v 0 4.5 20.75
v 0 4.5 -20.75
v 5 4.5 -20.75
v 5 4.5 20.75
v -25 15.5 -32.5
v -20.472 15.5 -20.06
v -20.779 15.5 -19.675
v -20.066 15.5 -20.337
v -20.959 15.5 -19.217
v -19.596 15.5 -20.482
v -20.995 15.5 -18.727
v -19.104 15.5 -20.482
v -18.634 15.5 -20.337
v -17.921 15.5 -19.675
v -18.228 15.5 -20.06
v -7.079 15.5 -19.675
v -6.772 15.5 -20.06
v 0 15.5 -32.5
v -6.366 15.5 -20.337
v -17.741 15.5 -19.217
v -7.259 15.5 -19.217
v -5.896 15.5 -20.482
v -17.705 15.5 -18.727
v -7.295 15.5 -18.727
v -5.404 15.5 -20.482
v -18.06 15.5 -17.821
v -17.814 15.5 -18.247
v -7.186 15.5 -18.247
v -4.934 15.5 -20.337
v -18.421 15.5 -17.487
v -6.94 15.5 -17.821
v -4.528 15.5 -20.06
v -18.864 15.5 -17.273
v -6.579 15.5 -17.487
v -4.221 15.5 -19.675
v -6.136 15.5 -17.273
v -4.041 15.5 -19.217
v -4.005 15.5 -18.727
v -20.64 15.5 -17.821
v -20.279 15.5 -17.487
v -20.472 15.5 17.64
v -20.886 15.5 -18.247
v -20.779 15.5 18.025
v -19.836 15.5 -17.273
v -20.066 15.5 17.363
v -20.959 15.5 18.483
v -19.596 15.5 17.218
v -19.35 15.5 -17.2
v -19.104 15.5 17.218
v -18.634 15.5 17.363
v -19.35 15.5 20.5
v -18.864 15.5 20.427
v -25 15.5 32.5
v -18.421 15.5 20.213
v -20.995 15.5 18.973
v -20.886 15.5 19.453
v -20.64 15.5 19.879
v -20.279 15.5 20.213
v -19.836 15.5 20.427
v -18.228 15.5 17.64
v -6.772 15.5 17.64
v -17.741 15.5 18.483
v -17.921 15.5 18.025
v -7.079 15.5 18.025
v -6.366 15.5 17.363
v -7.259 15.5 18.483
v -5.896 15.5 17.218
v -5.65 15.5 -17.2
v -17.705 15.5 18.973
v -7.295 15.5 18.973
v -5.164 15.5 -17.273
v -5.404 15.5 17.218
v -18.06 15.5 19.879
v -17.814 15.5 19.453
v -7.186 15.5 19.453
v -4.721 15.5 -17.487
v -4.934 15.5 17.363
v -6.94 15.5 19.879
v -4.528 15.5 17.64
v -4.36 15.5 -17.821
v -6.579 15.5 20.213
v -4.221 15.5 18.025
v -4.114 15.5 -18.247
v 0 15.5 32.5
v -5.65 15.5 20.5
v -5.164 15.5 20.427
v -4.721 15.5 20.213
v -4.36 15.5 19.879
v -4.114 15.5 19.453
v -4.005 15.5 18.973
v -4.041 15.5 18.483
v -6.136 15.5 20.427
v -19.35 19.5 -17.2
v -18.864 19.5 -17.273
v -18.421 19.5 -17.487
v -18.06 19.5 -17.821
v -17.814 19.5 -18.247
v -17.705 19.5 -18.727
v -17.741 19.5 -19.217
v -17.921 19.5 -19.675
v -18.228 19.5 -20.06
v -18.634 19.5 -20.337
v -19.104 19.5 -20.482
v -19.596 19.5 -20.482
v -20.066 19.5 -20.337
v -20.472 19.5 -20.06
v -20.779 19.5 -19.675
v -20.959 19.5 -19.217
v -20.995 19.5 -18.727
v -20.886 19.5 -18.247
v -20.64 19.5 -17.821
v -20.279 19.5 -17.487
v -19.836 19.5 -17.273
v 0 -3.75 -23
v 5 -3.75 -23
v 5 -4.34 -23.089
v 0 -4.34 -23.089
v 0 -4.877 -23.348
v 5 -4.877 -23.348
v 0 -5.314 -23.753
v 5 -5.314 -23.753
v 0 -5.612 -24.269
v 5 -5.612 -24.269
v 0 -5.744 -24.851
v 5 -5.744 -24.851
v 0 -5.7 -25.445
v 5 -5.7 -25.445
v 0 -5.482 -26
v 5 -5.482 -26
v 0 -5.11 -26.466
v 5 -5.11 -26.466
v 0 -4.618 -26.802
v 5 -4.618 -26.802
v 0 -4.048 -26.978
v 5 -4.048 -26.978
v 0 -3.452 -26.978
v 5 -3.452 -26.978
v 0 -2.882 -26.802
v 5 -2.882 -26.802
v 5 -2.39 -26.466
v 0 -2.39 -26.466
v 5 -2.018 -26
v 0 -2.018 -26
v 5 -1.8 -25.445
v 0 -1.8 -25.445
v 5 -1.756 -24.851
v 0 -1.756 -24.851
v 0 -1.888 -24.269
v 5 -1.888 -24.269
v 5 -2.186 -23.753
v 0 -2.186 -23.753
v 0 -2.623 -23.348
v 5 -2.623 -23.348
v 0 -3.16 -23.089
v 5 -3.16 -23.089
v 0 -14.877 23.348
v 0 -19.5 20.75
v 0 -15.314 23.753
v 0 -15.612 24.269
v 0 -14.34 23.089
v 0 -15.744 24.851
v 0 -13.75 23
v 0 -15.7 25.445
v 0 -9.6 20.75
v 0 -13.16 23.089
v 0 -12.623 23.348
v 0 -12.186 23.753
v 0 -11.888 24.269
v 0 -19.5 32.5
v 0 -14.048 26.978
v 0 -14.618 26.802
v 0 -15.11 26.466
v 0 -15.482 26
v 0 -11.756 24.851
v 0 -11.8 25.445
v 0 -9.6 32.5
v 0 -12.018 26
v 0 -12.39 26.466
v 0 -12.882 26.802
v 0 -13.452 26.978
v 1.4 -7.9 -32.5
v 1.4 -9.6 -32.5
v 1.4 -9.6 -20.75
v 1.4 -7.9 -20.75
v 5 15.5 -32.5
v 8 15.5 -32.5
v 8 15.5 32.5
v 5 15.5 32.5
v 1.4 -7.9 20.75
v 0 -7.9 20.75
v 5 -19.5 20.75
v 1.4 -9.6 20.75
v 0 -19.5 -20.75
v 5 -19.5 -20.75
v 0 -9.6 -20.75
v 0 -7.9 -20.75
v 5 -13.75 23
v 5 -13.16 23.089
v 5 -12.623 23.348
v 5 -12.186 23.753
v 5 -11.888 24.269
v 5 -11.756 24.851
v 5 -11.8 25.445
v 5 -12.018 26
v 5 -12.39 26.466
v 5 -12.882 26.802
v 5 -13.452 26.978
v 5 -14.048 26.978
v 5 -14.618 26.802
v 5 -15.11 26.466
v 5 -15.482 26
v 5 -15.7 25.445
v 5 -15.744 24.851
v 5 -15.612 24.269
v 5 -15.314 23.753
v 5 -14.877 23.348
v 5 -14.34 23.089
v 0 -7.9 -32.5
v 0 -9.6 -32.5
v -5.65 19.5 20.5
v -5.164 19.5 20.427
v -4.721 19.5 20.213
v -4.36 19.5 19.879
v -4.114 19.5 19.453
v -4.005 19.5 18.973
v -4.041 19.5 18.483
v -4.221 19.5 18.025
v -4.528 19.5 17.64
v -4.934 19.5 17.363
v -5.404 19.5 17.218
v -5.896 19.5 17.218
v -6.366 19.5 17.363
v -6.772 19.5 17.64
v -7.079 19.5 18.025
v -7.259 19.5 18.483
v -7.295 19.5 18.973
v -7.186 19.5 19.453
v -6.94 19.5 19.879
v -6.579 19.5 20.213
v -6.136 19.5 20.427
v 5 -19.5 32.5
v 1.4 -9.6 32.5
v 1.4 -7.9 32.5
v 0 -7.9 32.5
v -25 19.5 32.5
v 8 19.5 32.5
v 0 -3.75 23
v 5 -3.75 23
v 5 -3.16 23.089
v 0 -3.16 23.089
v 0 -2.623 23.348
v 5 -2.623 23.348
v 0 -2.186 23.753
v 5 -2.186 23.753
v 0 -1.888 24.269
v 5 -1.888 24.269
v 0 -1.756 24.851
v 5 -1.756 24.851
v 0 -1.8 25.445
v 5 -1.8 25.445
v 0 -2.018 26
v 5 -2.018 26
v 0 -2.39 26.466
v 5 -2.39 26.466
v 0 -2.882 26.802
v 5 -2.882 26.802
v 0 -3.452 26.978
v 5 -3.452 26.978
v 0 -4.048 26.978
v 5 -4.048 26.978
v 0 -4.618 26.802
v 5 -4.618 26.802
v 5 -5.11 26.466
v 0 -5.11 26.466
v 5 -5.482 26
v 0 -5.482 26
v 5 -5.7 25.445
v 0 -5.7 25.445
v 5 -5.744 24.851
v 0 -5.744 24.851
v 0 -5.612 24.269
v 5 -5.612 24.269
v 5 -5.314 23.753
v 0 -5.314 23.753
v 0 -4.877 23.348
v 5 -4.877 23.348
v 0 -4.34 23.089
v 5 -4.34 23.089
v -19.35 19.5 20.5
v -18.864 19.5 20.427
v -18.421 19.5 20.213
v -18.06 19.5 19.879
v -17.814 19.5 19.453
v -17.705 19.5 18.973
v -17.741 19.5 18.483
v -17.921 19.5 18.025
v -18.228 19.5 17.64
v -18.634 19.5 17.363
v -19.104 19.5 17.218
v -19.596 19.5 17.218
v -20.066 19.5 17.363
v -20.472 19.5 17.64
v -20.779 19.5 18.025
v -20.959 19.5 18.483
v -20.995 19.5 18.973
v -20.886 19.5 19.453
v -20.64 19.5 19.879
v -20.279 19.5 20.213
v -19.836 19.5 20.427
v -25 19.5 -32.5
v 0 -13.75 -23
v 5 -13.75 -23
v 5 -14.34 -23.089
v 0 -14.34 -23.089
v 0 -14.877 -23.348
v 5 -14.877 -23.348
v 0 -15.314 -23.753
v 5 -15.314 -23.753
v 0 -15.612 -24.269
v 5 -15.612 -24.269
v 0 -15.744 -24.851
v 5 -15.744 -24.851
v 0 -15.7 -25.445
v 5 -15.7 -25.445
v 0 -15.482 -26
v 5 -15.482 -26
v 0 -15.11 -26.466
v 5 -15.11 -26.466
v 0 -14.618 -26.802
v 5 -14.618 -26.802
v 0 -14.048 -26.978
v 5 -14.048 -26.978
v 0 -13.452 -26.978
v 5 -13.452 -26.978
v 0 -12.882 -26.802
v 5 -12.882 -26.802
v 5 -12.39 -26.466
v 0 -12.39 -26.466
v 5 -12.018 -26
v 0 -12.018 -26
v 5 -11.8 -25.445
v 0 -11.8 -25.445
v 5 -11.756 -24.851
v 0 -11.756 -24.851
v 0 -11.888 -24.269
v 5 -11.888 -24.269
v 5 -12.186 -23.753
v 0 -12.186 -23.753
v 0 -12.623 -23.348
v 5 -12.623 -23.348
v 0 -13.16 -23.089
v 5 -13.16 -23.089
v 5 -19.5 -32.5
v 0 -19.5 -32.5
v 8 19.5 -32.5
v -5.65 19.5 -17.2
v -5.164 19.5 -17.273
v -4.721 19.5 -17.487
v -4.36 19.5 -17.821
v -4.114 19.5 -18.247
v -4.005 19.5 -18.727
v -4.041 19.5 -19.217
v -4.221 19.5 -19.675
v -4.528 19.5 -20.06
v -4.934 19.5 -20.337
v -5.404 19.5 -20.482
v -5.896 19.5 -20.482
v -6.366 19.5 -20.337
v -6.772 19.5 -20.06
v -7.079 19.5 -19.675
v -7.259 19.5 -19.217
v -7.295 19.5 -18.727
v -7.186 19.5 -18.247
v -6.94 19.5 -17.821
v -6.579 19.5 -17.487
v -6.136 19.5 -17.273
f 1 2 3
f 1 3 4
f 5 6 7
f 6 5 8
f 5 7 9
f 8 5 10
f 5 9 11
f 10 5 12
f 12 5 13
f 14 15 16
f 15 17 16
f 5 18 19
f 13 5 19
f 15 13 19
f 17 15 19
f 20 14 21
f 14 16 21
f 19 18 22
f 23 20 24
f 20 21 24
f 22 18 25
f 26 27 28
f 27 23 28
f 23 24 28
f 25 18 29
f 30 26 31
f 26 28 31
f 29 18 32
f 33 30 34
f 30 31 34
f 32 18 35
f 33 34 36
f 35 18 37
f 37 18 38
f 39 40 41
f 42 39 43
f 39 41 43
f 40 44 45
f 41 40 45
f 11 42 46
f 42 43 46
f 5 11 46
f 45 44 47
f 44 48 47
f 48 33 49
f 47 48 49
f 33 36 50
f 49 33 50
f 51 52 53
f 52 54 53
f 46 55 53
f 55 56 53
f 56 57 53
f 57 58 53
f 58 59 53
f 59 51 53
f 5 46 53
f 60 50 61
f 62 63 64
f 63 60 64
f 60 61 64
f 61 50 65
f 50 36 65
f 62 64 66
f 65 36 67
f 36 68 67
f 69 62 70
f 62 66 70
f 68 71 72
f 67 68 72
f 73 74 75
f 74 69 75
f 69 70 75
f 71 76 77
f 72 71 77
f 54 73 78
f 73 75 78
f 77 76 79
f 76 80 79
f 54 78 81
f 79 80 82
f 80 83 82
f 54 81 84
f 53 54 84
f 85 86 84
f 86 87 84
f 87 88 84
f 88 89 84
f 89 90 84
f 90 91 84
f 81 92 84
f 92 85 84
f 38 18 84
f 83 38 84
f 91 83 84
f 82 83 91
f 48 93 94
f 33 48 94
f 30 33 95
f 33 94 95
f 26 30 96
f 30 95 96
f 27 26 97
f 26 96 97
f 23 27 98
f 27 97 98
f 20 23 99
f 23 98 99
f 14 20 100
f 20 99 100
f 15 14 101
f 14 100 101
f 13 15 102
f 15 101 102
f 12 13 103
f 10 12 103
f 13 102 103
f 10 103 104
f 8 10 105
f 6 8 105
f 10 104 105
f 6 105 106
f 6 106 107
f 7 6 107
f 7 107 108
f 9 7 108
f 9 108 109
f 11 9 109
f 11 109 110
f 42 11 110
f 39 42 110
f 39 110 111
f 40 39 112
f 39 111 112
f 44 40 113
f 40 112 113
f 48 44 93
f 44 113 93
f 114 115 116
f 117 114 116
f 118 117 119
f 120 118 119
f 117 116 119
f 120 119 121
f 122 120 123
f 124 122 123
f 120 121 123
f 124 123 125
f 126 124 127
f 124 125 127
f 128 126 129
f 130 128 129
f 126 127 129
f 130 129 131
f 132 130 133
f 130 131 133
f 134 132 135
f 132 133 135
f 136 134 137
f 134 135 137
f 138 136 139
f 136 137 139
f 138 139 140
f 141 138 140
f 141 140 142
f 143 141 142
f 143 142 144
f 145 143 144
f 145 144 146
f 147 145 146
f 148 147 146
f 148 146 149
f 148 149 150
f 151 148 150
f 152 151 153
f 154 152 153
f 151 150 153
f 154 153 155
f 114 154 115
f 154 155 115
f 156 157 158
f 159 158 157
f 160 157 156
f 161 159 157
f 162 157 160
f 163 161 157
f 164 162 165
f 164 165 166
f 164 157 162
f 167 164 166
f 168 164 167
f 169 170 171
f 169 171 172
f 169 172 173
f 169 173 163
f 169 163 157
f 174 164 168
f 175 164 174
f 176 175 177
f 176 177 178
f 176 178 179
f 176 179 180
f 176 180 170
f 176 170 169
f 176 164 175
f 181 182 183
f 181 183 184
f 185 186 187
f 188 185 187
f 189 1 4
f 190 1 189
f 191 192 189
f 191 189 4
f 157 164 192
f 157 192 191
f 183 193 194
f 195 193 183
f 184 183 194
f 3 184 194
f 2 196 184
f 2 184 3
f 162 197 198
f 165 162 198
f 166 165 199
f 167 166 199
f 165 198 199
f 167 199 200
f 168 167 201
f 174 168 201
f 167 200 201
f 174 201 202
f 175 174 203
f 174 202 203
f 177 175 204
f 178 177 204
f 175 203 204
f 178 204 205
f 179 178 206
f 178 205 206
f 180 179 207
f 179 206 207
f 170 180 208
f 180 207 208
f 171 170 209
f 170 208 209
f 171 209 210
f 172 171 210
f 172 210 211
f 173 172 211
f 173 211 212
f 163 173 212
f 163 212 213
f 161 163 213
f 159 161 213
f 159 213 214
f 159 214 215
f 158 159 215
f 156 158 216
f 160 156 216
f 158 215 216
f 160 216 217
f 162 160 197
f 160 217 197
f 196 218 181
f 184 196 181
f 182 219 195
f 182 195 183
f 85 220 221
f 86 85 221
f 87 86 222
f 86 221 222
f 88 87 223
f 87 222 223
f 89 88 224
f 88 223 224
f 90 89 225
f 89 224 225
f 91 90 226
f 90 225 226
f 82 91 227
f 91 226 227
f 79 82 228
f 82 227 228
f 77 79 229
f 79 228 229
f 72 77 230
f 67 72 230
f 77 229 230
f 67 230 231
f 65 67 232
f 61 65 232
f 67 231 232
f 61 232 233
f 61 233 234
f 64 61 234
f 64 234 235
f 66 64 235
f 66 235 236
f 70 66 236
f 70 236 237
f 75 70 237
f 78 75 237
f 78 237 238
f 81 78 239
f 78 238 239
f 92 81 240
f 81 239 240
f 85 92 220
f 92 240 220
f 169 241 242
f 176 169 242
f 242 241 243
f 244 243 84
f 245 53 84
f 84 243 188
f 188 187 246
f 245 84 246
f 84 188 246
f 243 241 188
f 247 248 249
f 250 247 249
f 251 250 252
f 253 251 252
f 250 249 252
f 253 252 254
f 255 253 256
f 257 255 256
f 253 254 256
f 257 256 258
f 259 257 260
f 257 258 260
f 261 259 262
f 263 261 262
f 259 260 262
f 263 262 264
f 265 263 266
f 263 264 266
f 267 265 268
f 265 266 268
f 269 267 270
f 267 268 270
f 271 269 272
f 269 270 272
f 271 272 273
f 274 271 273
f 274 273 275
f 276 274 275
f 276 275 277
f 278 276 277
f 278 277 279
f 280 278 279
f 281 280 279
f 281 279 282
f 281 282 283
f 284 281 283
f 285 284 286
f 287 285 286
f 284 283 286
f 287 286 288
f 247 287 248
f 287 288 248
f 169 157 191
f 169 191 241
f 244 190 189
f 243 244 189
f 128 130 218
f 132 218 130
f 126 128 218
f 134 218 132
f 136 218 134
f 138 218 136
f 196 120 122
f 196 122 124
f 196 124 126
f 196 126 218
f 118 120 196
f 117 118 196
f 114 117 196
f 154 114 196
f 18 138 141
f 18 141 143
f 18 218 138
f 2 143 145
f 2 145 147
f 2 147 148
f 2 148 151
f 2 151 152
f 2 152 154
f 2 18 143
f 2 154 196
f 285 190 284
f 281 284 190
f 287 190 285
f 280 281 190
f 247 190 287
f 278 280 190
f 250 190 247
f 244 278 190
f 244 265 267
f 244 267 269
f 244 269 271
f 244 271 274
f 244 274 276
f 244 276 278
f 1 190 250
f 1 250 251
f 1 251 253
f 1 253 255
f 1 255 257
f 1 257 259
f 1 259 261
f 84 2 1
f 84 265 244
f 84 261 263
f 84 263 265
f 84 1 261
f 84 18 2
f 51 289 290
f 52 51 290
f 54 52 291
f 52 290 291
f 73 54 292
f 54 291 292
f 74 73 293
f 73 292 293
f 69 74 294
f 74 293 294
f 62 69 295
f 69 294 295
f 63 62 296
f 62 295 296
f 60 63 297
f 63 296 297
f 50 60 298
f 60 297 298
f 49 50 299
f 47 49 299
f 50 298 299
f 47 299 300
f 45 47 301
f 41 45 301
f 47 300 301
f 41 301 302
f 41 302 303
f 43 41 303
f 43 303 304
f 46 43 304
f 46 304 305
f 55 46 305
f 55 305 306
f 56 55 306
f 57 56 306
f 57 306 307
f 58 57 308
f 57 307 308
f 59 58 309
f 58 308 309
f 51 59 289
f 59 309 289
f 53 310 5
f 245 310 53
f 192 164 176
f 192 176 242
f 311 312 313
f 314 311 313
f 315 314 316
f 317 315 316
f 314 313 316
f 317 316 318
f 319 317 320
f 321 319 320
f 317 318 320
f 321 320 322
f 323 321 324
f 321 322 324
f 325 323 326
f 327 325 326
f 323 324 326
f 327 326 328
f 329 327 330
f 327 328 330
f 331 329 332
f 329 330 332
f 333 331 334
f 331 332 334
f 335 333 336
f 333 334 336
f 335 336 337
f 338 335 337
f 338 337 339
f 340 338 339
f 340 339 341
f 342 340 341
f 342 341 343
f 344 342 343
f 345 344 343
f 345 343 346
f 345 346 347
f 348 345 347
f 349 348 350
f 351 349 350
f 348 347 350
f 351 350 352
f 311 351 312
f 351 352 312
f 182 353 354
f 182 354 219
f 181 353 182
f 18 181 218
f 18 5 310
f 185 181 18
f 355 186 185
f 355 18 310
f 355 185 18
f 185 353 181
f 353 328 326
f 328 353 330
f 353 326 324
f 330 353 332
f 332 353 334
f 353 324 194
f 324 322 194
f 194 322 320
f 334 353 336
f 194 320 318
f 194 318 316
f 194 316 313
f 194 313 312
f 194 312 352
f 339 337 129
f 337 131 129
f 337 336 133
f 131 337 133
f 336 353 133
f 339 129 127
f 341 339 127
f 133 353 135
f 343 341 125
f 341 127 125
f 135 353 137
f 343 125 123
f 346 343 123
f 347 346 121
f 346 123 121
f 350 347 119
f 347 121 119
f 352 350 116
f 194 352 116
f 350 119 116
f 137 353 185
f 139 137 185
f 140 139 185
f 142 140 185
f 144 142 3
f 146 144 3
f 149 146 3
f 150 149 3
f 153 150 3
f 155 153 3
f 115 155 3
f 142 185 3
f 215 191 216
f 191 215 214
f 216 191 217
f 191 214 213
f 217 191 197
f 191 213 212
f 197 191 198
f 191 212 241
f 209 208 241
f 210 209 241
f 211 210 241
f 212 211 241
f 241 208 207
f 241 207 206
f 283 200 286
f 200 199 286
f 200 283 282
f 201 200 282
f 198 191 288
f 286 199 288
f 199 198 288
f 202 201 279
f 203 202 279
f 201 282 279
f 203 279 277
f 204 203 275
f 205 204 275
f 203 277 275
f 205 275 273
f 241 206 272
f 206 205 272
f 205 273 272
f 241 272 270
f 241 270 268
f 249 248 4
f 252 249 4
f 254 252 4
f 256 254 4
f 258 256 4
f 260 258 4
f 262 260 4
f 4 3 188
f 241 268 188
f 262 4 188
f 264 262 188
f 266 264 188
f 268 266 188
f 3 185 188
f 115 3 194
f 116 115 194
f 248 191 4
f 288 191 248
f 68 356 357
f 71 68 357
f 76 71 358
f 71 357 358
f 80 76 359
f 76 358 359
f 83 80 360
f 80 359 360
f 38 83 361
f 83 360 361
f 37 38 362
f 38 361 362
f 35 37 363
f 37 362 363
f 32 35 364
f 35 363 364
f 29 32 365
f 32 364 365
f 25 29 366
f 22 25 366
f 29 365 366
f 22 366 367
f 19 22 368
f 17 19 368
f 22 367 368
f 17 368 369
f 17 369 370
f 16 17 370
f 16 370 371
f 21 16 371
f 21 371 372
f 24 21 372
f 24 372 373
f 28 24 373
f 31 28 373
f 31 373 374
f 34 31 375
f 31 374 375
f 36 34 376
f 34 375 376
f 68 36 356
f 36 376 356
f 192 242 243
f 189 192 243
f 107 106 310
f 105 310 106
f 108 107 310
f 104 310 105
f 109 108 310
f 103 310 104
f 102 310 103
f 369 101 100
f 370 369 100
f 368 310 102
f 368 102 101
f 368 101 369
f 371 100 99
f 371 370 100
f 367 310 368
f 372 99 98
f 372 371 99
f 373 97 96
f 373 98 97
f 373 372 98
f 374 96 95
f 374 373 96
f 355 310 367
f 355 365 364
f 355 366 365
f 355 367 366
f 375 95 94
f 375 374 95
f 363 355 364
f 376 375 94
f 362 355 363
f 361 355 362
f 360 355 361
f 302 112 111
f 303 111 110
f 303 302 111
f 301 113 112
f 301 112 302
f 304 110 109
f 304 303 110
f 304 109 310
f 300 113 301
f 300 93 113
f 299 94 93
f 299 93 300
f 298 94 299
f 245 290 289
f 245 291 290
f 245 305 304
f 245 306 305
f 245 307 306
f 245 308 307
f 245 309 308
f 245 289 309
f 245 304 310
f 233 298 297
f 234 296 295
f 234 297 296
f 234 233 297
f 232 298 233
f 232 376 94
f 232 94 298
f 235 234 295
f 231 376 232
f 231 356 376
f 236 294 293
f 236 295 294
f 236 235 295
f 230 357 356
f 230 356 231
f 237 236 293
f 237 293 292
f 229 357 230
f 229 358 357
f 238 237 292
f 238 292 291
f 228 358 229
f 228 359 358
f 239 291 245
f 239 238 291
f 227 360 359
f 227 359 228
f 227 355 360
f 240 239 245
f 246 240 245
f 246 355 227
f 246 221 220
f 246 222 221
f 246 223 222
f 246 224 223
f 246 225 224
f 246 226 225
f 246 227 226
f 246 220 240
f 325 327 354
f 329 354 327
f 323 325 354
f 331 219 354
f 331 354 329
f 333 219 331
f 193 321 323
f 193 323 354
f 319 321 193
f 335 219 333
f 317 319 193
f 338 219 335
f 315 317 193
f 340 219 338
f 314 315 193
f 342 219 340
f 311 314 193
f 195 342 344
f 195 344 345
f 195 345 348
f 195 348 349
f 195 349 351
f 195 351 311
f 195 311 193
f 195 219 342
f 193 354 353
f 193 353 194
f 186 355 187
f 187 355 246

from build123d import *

# Parameters (mm, degrees)
EXTRUDE_3_DEPTH      = 5
EXTRUDE_4_DEPTH      = 25
EXTRUDE_4_DEPTH_BACK = 8
SKETCH_4_W           = 65
SKETCH_4_H           = 4
CUT_EXTRUDE_START    = -65
SKETCH_5_W           = 1.4
SKETCH_5_H           = 1.7
CUT_EXTRUDE_1_DEPTH  = 65
SKETCH_6_R           = 2
CUT_EXTRUDE_2_DEPTH  = 5
SKETCH_7_R           = 1.65
CUT_EXTRUDE_3_DEPTH  = 4


with BuildPart() as part:
    # 草图2 → 凸台-拉伸3 (new body)
    with BuildSketch(Plane(origin=(0, 0, 0), x_dir=(0, 0, -1), z_dir=(1, 0, 0))):
        Polygon((32.5, -19.5), (20.75, -19.5), (20.75, 4.5), (-20.75, 4.5), (-20.75, -19.5), (-32.5, -19.5), (-32.5, 19.5), (32.5, 19.5), align=None)
    extrude(amount=EXTRUDE_3_DEPTH)

    # 草图4 → 凸台-拉伸4 (add, two sides: drawn at the far end of the back side and taken through both)
    with BuildSketch(Plane.ZY.offset(-EXTRUDE_4_DEPTH_BACK)):
        with Locations((0, 17.5)):
            Rectangle(SKETCH_4_W, SKETCH_4_H)
    extrude(amount=EXTRUDE_4_DEPTH + EXTRUDE_4_DEPTH_BACK)

    # 草图5 → 切除-拉伸1 (cut)
    with BuildSketch(Plane.XY.offset(32.5).offset(CUT_EXTRUDE_START)):
        with Locations((0.7, -8.75)):
            Rectangle(SKETCH_5_W, SKETCH_5_H)
    extrude(amount=CUT_EXTRUDE_1_DEPTH, mode=Mode.SUBTRACT)

    # 草图6 → 切除-拉伸2 (cut)
    with BuildSketch(Plane(origin=(5, 0, 0), x_dir=(0, 0, -1), z_dir=(1, 0, 0))):
        with Locations((-25, -3.75)):
            Circle(SKETCH_6_R)
        with Locations((-25, -13.75)):
            Circle(SKETCH_6_R)
        with Locations(Location((25, -13.75, 0), (0, 0, 180))):
            Circle(SKETCH_6_R)
        with Locations(Location((25, -3.75, 0), (0, 0, 180))):
            Circle(SKETCH_6_R)
    extrude(amount=-CUT_EXTRUDE_2_DEPTH, mode=Mode.SUBTRACT)

    # 草图7 → 切除-拉伸3 (cut)
    with BuildSketch(Plane(origin=(0, 19.5, 0), x_dir=(1, 0, 0), z_dir=(0, 1, 0))):
        with Locations(Location((-19.35, -18.85, 0), (0, 0, 270))):
            Circle(SKETCH_7_R)
        with Locations(Location((-5.65, -18.85, 0), (0, 0, 270))):
            Circle(SKETCH_7_R)
        with Locations(Location((-19.35, 18.85, 0), (0, 0, 270))):
            Circle(SKETCH_7_R)
        with Locations(Location((-5.65, 18.85, 0), (0, 0, 270))):
            Circle(SKETCH_7_R)
    extrude(amount=-CUT_EXTRUDE_3_DEPTH, mode=Mode.SUBTRACT)


solid = part.part
